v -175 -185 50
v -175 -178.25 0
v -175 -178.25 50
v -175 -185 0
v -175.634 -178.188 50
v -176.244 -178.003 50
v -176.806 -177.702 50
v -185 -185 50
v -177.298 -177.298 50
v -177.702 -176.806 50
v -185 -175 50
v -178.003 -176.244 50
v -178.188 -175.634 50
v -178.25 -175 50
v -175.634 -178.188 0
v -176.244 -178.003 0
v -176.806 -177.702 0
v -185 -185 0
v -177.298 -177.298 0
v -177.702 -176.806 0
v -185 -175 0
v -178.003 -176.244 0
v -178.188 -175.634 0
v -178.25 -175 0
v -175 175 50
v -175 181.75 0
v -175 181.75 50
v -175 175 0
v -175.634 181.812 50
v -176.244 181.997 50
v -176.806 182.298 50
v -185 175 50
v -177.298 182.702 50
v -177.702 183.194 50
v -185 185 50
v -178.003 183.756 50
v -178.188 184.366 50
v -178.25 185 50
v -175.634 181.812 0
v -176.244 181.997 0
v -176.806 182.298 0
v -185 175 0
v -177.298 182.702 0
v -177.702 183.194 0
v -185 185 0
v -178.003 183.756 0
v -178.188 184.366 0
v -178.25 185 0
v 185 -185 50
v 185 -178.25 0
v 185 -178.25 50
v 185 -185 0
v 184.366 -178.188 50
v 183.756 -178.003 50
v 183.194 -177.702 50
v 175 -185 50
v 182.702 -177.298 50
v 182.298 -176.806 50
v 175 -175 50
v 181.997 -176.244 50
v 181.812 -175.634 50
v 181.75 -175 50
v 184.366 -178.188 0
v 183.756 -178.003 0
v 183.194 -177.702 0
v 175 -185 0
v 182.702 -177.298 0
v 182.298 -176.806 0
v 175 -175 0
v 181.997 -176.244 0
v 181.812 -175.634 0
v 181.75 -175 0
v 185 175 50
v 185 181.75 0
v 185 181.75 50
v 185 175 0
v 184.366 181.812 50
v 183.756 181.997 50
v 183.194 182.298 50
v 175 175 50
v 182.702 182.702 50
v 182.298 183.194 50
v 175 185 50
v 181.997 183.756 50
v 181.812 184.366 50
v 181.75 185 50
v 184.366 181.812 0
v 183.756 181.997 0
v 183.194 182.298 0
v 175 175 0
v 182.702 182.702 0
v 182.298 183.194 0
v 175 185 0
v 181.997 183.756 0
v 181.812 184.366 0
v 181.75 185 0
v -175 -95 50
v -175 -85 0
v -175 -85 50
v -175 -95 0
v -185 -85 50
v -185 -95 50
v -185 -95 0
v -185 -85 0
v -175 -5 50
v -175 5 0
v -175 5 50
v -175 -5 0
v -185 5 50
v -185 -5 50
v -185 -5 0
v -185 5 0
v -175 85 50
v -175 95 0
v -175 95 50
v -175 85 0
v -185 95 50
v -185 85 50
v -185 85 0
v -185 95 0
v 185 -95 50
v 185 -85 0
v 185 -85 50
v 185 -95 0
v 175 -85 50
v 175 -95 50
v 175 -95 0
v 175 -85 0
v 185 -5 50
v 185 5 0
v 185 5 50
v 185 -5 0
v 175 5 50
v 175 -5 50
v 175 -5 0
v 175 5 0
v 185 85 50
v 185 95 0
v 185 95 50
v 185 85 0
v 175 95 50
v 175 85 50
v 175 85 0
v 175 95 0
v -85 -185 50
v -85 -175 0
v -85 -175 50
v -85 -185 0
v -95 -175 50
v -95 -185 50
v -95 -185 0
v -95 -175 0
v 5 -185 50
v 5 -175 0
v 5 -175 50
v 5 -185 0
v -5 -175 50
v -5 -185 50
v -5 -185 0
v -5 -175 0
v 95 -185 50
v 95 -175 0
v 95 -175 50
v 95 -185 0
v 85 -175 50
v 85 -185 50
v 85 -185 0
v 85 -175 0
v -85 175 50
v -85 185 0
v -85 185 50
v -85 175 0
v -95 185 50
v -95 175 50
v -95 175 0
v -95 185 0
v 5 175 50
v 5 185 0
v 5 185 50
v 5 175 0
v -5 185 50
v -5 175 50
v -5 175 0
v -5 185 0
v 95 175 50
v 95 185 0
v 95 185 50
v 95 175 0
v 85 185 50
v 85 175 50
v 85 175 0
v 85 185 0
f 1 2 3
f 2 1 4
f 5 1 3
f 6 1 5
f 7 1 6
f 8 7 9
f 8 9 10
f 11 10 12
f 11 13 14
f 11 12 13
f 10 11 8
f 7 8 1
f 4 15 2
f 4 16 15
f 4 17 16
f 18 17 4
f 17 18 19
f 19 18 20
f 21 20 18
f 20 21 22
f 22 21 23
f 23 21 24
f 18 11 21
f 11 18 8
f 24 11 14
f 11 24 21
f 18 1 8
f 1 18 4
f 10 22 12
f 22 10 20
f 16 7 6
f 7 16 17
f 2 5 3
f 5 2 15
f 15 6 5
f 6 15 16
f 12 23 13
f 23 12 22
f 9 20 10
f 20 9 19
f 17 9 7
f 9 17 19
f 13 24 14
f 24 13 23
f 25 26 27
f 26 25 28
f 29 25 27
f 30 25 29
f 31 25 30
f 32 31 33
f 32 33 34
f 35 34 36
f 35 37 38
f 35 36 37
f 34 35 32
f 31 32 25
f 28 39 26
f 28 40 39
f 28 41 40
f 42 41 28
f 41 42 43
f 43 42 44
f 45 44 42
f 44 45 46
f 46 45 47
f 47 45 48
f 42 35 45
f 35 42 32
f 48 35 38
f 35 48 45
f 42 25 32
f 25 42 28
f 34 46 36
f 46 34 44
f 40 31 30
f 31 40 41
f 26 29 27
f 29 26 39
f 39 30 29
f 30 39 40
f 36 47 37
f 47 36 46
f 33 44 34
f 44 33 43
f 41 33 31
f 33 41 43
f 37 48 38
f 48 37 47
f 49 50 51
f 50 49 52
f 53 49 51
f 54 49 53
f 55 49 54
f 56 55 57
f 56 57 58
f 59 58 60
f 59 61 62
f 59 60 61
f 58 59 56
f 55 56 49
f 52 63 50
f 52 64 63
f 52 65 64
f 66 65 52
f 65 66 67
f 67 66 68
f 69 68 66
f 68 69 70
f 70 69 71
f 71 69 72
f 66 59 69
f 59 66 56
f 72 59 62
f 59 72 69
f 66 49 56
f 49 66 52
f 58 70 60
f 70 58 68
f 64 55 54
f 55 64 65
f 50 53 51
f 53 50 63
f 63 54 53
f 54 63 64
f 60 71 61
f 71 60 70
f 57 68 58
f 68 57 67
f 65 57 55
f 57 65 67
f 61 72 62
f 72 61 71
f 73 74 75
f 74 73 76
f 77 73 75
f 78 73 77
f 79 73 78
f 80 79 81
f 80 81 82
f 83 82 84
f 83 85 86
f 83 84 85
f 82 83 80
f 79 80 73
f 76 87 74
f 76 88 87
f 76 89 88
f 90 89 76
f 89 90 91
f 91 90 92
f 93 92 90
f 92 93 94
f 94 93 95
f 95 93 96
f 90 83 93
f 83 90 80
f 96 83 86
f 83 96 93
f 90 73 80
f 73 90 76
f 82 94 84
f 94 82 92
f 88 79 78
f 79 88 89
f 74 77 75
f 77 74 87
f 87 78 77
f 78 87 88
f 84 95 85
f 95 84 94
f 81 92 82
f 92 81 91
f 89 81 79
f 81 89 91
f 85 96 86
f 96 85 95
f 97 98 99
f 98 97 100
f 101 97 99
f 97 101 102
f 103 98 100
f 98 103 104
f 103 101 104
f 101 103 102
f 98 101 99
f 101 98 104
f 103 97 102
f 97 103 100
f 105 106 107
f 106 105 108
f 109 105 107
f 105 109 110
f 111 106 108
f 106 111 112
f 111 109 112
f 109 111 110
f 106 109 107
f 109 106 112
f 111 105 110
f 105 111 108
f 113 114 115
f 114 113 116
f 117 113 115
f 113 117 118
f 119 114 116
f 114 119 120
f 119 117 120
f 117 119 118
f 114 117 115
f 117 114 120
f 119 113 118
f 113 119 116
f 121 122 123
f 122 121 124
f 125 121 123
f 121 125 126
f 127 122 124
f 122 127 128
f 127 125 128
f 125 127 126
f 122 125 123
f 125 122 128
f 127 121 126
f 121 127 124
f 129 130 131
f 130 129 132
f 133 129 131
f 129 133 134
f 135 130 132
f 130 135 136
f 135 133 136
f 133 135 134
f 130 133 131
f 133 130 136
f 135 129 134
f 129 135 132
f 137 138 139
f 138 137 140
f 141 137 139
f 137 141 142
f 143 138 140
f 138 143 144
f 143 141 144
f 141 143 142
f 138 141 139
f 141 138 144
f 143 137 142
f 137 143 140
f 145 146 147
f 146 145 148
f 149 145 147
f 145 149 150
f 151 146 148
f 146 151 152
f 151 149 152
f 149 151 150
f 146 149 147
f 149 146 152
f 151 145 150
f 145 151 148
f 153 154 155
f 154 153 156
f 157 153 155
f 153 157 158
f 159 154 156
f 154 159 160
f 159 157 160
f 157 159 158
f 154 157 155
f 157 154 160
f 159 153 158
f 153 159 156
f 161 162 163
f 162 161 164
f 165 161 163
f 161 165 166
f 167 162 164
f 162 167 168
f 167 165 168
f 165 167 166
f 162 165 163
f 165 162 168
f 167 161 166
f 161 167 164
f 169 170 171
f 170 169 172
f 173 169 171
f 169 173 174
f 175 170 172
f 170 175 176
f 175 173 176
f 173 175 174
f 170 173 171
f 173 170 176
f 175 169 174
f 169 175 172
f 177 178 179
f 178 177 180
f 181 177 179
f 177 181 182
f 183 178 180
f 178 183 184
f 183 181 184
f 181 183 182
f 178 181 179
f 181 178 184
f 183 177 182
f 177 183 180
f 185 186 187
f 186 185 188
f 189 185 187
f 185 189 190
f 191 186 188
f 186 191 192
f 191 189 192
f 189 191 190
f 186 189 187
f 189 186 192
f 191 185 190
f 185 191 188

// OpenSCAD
positions = [[-180,-180],[-180,-90],[-180,0],[-180,90],[-180,180],[180,-180],[180,-90],[180,0],[180,90],[180,180],[-90,-180],[0,-180],[90,-180],[-90,180],[0,180],[90,180]];
module vert(px,py){
translate([px,py,25])
difference(){
cube([10,10,50],center=true);
if (abs(px)==180 && abs(py)==180){
translate([5,5,0]) cylinder(r=3.25,h=55,$fn=32,center=true);
}
}
}
module hleft(zh){translate([-180,0,zh]) cube([10,370,10],center=true);}
module hright(zh){translate([180,0,zh]) cube([10,370,10],center=true);}
module hfront(zh){translate([0,-180,zh]) cube([370,10,10],center=true);}
module hback(zh){translate([0,180,zh]) cube([370,10,10],center=true);}
for(p=positions){
vert(p[0],p[1]);
}
